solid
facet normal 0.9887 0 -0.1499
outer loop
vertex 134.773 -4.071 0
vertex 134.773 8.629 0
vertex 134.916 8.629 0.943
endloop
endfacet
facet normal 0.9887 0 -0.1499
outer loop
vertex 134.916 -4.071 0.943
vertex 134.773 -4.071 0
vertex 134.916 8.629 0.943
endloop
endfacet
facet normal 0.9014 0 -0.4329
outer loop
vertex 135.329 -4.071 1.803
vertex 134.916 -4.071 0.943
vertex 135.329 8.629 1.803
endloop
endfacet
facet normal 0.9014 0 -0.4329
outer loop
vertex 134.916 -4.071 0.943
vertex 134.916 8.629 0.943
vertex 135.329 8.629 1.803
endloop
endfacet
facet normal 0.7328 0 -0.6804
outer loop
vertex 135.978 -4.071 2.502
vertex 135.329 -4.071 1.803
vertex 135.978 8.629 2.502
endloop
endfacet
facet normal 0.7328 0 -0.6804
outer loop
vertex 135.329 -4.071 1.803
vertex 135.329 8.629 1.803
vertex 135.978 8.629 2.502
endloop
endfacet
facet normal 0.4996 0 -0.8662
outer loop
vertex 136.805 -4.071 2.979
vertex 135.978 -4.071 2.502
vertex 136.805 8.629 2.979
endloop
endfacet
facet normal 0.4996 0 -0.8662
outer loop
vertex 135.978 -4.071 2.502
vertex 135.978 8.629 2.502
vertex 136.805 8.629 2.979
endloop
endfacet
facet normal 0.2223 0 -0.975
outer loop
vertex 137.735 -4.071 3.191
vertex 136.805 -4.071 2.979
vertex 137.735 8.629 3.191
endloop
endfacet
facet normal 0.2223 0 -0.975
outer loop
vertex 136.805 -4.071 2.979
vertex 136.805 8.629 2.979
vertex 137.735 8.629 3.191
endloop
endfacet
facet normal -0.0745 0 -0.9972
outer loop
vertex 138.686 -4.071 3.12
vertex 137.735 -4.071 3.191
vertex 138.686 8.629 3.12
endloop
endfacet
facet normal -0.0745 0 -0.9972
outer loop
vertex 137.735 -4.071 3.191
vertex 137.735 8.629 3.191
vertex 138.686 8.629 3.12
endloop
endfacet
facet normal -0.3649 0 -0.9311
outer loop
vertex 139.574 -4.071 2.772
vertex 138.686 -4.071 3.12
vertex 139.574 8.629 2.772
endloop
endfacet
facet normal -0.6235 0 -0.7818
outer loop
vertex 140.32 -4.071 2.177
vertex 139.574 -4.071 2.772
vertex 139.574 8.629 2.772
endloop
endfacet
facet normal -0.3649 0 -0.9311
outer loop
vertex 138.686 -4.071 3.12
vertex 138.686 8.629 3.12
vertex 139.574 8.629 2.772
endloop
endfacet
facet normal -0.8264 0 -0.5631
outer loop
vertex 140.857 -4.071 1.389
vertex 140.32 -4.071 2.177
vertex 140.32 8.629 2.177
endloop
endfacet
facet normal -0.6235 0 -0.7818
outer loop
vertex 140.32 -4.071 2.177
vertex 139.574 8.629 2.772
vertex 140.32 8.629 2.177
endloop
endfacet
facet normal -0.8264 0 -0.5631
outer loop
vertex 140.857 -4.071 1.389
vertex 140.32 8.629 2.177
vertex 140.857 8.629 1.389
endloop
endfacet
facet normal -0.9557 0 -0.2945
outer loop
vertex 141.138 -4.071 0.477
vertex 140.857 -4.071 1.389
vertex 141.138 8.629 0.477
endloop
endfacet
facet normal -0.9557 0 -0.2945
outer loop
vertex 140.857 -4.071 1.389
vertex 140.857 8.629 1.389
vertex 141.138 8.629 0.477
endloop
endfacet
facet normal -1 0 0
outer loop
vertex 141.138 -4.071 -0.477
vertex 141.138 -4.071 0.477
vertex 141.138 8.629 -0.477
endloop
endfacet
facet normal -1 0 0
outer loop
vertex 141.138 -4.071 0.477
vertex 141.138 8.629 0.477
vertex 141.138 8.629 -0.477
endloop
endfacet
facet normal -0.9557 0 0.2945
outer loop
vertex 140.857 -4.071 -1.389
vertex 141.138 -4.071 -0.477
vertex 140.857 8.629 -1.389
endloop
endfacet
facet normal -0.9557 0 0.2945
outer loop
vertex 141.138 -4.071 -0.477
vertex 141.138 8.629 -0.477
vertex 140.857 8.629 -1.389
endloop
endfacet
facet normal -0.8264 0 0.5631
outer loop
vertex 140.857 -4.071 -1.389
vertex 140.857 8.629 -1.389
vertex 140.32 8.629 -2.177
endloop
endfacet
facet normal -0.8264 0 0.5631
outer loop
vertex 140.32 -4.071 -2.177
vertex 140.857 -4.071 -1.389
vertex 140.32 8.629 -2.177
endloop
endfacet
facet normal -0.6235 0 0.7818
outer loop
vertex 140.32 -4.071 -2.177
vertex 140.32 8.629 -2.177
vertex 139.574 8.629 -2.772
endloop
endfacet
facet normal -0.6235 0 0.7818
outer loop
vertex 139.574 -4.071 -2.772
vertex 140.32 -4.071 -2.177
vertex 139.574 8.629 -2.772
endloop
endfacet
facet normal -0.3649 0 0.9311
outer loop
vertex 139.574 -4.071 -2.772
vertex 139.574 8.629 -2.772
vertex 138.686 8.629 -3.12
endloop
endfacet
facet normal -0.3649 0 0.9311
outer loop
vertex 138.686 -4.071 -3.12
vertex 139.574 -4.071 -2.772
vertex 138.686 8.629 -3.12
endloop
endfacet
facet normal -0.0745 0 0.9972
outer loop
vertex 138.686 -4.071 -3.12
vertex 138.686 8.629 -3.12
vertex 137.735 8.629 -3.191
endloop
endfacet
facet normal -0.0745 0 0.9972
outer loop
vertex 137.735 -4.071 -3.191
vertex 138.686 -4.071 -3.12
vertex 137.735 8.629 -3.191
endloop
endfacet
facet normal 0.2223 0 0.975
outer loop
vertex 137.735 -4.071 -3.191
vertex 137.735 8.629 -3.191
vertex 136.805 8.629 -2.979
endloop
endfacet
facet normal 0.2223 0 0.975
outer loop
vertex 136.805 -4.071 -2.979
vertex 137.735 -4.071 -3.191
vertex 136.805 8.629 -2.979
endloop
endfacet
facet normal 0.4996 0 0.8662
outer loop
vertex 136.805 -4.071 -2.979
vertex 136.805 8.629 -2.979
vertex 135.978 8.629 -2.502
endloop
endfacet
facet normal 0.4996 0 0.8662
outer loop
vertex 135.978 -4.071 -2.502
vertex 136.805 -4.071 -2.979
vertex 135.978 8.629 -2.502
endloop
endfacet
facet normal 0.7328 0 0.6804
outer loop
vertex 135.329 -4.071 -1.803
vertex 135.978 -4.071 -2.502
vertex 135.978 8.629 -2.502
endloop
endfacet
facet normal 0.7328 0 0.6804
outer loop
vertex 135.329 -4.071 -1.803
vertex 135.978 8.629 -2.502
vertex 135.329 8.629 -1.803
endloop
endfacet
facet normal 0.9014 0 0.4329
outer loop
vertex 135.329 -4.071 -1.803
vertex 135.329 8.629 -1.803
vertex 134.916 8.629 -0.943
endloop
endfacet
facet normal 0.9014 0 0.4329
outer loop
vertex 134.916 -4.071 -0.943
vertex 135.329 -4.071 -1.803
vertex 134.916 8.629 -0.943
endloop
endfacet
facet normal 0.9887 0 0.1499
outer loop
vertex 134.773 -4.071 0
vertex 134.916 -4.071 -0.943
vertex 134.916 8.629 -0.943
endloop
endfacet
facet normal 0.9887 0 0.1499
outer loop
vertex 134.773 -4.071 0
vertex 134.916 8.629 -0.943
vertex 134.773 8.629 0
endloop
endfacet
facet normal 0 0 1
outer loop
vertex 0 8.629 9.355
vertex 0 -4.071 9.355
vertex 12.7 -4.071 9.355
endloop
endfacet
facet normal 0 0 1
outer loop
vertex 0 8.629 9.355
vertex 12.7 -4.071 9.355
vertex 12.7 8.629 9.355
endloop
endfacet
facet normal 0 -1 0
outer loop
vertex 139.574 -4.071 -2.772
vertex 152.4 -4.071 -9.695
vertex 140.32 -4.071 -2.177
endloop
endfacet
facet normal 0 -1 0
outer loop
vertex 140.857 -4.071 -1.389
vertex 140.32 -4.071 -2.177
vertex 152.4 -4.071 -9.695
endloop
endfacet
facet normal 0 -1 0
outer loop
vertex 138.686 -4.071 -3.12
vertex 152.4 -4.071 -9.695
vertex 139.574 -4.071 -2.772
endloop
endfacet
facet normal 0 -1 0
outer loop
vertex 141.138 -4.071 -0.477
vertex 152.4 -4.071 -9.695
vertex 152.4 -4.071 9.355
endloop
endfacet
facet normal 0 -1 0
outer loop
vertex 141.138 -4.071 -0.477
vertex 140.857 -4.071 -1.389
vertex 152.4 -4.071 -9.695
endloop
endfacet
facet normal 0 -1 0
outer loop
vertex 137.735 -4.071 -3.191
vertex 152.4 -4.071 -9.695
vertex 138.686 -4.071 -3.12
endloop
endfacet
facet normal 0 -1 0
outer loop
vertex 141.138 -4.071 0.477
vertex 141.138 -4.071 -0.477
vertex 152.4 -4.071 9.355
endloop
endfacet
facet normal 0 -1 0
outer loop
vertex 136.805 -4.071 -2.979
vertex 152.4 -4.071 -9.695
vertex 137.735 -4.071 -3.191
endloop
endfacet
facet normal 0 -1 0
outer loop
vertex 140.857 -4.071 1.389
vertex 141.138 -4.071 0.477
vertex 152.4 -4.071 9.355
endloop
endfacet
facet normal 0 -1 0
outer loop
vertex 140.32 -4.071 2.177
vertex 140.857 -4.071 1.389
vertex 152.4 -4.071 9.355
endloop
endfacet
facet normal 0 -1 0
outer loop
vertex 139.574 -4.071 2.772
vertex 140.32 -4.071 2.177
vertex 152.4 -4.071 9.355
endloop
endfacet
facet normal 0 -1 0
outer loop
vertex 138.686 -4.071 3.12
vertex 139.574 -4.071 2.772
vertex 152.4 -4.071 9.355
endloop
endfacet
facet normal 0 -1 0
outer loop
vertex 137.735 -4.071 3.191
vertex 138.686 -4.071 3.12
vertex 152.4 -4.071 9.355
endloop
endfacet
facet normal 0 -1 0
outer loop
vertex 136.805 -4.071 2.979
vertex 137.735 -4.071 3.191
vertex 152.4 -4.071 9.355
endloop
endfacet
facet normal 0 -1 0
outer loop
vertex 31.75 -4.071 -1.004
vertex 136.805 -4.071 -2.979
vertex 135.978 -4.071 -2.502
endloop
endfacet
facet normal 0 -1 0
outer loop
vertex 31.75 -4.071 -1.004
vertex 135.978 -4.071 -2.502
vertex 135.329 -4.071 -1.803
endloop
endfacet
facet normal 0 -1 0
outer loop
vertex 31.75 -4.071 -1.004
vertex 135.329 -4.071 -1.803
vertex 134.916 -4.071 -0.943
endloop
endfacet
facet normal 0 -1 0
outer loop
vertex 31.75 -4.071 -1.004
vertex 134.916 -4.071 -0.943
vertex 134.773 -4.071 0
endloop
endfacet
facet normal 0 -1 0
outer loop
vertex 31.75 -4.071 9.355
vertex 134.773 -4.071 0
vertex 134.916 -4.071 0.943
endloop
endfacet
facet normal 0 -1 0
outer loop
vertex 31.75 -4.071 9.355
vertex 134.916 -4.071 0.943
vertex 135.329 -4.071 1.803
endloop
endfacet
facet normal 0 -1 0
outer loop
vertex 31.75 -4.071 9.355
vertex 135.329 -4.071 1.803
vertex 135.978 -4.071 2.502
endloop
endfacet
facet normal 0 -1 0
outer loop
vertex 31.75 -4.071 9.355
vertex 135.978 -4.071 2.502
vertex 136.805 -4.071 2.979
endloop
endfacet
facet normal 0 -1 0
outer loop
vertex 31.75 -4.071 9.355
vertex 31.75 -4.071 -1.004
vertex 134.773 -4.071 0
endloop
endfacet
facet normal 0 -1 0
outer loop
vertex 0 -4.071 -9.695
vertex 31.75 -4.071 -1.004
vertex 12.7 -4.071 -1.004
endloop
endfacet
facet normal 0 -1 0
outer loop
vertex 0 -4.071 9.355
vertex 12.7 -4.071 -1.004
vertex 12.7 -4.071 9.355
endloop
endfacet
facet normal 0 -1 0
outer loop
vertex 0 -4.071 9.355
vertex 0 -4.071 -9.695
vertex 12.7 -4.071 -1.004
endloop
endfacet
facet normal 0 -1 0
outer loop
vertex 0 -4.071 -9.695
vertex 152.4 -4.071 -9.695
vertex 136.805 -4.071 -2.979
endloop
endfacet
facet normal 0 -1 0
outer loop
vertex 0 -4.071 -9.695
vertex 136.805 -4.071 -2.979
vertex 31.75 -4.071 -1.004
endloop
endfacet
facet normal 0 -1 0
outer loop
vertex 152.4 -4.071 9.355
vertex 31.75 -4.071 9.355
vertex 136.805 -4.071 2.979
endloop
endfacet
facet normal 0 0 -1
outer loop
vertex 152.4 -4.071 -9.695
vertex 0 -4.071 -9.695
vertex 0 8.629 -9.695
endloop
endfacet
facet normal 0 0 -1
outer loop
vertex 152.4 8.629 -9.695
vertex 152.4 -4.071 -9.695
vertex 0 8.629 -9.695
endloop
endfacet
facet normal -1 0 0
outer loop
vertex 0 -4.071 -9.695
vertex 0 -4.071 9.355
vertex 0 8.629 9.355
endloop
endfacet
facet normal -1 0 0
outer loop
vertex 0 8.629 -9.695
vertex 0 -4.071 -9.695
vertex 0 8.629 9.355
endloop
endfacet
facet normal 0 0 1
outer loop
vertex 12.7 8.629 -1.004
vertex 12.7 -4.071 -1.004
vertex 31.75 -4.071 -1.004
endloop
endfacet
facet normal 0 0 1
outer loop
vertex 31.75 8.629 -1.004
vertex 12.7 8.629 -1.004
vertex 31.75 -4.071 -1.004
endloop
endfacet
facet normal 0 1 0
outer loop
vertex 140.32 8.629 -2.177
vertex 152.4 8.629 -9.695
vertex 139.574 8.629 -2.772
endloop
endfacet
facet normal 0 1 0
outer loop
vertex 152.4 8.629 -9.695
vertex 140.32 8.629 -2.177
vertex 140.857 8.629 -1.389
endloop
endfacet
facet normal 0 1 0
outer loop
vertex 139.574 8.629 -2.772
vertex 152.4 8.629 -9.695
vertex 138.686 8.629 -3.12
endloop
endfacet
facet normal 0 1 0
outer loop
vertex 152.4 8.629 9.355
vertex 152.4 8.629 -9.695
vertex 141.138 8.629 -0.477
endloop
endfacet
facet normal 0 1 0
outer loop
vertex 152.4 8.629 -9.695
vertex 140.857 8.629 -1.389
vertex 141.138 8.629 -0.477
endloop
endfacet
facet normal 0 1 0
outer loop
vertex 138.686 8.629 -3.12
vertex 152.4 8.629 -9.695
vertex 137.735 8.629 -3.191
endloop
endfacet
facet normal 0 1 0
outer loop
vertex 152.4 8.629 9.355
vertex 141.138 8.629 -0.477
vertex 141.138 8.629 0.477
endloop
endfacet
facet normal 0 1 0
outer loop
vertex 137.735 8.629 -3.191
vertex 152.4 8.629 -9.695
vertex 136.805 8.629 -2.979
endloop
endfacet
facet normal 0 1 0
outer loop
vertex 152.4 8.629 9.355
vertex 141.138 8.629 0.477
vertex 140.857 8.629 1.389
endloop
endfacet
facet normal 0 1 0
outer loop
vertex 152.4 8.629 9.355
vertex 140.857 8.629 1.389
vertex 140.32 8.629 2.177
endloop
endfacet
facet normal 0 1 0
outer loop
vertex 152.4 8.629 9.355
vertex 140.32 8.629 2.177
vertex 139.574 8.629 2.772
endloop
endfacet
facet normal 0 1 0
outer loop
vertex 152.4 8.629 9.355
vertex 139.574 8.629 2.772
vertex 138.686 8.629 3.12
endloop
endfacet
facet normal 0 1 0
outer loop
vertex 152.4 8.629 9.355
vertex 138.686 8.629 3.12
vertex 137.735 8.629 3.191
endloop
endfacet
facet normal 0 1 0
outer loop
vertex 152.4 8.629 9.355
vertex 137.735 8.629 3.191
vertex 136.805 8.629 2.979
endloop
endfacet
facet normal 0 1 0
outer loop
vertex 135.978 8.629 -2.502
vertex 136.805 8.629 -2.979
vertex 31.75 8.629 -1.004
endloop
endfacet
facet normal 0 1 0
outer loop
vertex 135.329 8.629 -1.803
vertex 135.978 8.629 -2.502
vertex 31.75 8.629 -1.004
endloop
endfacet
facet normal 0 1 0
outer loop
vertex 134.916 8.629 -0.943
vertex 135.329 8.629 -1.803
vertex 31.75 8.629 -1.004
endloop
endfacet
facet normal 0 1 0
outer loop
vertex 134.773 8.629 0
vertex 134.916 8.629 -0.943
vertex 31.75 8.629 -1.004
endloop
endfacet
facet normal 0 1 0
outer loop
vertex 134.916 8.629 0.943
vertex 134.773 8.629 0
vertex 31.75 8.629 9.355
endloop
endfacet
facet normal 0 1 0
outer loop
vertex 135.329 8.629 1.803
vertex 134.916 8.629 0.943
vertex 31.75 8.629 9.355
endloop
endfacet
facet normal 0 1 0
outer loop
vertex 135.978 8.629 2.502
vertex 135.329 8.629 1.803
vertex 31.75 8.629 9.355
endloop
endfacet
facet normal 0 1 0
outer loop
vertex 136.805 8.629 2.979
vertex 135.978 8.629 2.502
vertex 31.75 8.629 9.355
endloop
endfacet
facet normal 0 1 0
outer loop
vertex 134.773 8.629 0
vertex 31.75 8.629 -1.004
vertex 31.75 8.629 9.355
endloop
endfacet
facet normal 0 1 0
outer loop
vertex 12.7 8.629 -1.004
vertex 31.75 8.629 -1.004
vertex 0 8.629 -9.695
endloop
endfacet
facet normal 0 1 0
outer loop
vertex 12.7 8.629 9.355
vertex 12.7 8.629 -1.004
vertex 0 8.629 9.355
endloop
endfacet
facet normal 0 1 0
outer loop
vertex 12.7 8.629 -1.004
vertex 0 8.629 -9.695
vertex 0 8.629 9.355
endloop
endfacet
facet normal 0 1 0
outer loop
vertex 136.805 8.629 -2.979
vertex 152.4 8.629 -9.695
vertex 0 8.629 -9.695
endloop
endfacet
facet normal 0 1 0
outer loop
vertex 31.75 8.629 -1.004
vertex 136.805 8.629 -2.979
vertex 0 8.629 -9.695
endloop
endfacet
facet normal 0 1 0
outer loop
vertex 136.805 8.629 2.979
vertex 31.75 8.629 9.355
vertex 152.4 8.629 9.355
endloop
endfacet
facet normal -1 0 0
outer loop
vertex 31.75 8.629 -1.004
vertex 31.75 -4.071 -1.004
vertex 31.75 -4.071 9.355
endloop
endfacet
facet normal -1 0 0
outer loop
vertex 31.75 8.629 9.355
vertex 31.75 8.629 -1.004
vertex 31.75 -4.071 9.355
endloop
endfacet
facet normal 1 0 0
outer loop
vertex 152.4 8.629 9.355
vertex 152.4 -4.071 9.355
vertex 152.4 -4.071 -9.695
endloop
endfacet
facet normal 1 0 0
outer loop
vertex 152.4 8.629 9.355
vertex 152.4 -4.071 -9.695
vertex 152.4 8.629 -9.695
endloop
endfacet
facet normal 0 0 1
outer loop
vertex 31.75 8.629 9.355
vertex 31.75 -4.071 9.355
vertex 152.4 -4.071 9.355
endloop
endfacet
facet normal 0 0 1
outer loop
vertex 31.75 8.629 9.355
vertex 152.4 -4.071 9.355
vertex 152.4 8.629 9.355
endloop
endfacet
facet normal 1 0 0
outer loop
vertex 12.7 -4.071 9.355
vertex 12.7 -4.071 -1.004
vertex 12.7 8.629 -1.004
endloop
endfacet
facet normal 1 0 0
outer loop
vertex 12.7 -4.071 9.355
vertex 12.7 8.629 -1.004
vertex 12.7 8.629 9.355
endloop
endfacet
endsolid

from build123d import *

# Parameters (mm, degrees)
F0_W     = 12.7
F0_H     = 19.05
F1_DEPTH = 152.4
F2_W     = 19.05
F2_H     = 10.359494
F3_DEPTH = 25.4
F5_D     = 6.4008


with BuildPart() as f1:
    # F0 (on Right) → F1 (new body)
    with BuildSketch(Plane.YZ):
        with Locations((2.279275, -0.169806)):
            Rectangle(F0_W, F0_H)
    extrude(amount=F1_DEPTH)

    # F2 (on face) → F3 (cut)
    with BuildSketch(Plane.XZ.offset(4.070725)):
        with Locations((22.225, 4.175447)):
            Rectangle(F2_W, F2_H)
    extrude(amount=-F3_DEPTH, mode=Mode.SUBTRACT)

    # F5 (through all)
    with Locations(Plane.XZ.offset(4.070725)):
        with Locations((137.973741, 0)):
            Hole(F5_D / 2)


solid = f1.part
